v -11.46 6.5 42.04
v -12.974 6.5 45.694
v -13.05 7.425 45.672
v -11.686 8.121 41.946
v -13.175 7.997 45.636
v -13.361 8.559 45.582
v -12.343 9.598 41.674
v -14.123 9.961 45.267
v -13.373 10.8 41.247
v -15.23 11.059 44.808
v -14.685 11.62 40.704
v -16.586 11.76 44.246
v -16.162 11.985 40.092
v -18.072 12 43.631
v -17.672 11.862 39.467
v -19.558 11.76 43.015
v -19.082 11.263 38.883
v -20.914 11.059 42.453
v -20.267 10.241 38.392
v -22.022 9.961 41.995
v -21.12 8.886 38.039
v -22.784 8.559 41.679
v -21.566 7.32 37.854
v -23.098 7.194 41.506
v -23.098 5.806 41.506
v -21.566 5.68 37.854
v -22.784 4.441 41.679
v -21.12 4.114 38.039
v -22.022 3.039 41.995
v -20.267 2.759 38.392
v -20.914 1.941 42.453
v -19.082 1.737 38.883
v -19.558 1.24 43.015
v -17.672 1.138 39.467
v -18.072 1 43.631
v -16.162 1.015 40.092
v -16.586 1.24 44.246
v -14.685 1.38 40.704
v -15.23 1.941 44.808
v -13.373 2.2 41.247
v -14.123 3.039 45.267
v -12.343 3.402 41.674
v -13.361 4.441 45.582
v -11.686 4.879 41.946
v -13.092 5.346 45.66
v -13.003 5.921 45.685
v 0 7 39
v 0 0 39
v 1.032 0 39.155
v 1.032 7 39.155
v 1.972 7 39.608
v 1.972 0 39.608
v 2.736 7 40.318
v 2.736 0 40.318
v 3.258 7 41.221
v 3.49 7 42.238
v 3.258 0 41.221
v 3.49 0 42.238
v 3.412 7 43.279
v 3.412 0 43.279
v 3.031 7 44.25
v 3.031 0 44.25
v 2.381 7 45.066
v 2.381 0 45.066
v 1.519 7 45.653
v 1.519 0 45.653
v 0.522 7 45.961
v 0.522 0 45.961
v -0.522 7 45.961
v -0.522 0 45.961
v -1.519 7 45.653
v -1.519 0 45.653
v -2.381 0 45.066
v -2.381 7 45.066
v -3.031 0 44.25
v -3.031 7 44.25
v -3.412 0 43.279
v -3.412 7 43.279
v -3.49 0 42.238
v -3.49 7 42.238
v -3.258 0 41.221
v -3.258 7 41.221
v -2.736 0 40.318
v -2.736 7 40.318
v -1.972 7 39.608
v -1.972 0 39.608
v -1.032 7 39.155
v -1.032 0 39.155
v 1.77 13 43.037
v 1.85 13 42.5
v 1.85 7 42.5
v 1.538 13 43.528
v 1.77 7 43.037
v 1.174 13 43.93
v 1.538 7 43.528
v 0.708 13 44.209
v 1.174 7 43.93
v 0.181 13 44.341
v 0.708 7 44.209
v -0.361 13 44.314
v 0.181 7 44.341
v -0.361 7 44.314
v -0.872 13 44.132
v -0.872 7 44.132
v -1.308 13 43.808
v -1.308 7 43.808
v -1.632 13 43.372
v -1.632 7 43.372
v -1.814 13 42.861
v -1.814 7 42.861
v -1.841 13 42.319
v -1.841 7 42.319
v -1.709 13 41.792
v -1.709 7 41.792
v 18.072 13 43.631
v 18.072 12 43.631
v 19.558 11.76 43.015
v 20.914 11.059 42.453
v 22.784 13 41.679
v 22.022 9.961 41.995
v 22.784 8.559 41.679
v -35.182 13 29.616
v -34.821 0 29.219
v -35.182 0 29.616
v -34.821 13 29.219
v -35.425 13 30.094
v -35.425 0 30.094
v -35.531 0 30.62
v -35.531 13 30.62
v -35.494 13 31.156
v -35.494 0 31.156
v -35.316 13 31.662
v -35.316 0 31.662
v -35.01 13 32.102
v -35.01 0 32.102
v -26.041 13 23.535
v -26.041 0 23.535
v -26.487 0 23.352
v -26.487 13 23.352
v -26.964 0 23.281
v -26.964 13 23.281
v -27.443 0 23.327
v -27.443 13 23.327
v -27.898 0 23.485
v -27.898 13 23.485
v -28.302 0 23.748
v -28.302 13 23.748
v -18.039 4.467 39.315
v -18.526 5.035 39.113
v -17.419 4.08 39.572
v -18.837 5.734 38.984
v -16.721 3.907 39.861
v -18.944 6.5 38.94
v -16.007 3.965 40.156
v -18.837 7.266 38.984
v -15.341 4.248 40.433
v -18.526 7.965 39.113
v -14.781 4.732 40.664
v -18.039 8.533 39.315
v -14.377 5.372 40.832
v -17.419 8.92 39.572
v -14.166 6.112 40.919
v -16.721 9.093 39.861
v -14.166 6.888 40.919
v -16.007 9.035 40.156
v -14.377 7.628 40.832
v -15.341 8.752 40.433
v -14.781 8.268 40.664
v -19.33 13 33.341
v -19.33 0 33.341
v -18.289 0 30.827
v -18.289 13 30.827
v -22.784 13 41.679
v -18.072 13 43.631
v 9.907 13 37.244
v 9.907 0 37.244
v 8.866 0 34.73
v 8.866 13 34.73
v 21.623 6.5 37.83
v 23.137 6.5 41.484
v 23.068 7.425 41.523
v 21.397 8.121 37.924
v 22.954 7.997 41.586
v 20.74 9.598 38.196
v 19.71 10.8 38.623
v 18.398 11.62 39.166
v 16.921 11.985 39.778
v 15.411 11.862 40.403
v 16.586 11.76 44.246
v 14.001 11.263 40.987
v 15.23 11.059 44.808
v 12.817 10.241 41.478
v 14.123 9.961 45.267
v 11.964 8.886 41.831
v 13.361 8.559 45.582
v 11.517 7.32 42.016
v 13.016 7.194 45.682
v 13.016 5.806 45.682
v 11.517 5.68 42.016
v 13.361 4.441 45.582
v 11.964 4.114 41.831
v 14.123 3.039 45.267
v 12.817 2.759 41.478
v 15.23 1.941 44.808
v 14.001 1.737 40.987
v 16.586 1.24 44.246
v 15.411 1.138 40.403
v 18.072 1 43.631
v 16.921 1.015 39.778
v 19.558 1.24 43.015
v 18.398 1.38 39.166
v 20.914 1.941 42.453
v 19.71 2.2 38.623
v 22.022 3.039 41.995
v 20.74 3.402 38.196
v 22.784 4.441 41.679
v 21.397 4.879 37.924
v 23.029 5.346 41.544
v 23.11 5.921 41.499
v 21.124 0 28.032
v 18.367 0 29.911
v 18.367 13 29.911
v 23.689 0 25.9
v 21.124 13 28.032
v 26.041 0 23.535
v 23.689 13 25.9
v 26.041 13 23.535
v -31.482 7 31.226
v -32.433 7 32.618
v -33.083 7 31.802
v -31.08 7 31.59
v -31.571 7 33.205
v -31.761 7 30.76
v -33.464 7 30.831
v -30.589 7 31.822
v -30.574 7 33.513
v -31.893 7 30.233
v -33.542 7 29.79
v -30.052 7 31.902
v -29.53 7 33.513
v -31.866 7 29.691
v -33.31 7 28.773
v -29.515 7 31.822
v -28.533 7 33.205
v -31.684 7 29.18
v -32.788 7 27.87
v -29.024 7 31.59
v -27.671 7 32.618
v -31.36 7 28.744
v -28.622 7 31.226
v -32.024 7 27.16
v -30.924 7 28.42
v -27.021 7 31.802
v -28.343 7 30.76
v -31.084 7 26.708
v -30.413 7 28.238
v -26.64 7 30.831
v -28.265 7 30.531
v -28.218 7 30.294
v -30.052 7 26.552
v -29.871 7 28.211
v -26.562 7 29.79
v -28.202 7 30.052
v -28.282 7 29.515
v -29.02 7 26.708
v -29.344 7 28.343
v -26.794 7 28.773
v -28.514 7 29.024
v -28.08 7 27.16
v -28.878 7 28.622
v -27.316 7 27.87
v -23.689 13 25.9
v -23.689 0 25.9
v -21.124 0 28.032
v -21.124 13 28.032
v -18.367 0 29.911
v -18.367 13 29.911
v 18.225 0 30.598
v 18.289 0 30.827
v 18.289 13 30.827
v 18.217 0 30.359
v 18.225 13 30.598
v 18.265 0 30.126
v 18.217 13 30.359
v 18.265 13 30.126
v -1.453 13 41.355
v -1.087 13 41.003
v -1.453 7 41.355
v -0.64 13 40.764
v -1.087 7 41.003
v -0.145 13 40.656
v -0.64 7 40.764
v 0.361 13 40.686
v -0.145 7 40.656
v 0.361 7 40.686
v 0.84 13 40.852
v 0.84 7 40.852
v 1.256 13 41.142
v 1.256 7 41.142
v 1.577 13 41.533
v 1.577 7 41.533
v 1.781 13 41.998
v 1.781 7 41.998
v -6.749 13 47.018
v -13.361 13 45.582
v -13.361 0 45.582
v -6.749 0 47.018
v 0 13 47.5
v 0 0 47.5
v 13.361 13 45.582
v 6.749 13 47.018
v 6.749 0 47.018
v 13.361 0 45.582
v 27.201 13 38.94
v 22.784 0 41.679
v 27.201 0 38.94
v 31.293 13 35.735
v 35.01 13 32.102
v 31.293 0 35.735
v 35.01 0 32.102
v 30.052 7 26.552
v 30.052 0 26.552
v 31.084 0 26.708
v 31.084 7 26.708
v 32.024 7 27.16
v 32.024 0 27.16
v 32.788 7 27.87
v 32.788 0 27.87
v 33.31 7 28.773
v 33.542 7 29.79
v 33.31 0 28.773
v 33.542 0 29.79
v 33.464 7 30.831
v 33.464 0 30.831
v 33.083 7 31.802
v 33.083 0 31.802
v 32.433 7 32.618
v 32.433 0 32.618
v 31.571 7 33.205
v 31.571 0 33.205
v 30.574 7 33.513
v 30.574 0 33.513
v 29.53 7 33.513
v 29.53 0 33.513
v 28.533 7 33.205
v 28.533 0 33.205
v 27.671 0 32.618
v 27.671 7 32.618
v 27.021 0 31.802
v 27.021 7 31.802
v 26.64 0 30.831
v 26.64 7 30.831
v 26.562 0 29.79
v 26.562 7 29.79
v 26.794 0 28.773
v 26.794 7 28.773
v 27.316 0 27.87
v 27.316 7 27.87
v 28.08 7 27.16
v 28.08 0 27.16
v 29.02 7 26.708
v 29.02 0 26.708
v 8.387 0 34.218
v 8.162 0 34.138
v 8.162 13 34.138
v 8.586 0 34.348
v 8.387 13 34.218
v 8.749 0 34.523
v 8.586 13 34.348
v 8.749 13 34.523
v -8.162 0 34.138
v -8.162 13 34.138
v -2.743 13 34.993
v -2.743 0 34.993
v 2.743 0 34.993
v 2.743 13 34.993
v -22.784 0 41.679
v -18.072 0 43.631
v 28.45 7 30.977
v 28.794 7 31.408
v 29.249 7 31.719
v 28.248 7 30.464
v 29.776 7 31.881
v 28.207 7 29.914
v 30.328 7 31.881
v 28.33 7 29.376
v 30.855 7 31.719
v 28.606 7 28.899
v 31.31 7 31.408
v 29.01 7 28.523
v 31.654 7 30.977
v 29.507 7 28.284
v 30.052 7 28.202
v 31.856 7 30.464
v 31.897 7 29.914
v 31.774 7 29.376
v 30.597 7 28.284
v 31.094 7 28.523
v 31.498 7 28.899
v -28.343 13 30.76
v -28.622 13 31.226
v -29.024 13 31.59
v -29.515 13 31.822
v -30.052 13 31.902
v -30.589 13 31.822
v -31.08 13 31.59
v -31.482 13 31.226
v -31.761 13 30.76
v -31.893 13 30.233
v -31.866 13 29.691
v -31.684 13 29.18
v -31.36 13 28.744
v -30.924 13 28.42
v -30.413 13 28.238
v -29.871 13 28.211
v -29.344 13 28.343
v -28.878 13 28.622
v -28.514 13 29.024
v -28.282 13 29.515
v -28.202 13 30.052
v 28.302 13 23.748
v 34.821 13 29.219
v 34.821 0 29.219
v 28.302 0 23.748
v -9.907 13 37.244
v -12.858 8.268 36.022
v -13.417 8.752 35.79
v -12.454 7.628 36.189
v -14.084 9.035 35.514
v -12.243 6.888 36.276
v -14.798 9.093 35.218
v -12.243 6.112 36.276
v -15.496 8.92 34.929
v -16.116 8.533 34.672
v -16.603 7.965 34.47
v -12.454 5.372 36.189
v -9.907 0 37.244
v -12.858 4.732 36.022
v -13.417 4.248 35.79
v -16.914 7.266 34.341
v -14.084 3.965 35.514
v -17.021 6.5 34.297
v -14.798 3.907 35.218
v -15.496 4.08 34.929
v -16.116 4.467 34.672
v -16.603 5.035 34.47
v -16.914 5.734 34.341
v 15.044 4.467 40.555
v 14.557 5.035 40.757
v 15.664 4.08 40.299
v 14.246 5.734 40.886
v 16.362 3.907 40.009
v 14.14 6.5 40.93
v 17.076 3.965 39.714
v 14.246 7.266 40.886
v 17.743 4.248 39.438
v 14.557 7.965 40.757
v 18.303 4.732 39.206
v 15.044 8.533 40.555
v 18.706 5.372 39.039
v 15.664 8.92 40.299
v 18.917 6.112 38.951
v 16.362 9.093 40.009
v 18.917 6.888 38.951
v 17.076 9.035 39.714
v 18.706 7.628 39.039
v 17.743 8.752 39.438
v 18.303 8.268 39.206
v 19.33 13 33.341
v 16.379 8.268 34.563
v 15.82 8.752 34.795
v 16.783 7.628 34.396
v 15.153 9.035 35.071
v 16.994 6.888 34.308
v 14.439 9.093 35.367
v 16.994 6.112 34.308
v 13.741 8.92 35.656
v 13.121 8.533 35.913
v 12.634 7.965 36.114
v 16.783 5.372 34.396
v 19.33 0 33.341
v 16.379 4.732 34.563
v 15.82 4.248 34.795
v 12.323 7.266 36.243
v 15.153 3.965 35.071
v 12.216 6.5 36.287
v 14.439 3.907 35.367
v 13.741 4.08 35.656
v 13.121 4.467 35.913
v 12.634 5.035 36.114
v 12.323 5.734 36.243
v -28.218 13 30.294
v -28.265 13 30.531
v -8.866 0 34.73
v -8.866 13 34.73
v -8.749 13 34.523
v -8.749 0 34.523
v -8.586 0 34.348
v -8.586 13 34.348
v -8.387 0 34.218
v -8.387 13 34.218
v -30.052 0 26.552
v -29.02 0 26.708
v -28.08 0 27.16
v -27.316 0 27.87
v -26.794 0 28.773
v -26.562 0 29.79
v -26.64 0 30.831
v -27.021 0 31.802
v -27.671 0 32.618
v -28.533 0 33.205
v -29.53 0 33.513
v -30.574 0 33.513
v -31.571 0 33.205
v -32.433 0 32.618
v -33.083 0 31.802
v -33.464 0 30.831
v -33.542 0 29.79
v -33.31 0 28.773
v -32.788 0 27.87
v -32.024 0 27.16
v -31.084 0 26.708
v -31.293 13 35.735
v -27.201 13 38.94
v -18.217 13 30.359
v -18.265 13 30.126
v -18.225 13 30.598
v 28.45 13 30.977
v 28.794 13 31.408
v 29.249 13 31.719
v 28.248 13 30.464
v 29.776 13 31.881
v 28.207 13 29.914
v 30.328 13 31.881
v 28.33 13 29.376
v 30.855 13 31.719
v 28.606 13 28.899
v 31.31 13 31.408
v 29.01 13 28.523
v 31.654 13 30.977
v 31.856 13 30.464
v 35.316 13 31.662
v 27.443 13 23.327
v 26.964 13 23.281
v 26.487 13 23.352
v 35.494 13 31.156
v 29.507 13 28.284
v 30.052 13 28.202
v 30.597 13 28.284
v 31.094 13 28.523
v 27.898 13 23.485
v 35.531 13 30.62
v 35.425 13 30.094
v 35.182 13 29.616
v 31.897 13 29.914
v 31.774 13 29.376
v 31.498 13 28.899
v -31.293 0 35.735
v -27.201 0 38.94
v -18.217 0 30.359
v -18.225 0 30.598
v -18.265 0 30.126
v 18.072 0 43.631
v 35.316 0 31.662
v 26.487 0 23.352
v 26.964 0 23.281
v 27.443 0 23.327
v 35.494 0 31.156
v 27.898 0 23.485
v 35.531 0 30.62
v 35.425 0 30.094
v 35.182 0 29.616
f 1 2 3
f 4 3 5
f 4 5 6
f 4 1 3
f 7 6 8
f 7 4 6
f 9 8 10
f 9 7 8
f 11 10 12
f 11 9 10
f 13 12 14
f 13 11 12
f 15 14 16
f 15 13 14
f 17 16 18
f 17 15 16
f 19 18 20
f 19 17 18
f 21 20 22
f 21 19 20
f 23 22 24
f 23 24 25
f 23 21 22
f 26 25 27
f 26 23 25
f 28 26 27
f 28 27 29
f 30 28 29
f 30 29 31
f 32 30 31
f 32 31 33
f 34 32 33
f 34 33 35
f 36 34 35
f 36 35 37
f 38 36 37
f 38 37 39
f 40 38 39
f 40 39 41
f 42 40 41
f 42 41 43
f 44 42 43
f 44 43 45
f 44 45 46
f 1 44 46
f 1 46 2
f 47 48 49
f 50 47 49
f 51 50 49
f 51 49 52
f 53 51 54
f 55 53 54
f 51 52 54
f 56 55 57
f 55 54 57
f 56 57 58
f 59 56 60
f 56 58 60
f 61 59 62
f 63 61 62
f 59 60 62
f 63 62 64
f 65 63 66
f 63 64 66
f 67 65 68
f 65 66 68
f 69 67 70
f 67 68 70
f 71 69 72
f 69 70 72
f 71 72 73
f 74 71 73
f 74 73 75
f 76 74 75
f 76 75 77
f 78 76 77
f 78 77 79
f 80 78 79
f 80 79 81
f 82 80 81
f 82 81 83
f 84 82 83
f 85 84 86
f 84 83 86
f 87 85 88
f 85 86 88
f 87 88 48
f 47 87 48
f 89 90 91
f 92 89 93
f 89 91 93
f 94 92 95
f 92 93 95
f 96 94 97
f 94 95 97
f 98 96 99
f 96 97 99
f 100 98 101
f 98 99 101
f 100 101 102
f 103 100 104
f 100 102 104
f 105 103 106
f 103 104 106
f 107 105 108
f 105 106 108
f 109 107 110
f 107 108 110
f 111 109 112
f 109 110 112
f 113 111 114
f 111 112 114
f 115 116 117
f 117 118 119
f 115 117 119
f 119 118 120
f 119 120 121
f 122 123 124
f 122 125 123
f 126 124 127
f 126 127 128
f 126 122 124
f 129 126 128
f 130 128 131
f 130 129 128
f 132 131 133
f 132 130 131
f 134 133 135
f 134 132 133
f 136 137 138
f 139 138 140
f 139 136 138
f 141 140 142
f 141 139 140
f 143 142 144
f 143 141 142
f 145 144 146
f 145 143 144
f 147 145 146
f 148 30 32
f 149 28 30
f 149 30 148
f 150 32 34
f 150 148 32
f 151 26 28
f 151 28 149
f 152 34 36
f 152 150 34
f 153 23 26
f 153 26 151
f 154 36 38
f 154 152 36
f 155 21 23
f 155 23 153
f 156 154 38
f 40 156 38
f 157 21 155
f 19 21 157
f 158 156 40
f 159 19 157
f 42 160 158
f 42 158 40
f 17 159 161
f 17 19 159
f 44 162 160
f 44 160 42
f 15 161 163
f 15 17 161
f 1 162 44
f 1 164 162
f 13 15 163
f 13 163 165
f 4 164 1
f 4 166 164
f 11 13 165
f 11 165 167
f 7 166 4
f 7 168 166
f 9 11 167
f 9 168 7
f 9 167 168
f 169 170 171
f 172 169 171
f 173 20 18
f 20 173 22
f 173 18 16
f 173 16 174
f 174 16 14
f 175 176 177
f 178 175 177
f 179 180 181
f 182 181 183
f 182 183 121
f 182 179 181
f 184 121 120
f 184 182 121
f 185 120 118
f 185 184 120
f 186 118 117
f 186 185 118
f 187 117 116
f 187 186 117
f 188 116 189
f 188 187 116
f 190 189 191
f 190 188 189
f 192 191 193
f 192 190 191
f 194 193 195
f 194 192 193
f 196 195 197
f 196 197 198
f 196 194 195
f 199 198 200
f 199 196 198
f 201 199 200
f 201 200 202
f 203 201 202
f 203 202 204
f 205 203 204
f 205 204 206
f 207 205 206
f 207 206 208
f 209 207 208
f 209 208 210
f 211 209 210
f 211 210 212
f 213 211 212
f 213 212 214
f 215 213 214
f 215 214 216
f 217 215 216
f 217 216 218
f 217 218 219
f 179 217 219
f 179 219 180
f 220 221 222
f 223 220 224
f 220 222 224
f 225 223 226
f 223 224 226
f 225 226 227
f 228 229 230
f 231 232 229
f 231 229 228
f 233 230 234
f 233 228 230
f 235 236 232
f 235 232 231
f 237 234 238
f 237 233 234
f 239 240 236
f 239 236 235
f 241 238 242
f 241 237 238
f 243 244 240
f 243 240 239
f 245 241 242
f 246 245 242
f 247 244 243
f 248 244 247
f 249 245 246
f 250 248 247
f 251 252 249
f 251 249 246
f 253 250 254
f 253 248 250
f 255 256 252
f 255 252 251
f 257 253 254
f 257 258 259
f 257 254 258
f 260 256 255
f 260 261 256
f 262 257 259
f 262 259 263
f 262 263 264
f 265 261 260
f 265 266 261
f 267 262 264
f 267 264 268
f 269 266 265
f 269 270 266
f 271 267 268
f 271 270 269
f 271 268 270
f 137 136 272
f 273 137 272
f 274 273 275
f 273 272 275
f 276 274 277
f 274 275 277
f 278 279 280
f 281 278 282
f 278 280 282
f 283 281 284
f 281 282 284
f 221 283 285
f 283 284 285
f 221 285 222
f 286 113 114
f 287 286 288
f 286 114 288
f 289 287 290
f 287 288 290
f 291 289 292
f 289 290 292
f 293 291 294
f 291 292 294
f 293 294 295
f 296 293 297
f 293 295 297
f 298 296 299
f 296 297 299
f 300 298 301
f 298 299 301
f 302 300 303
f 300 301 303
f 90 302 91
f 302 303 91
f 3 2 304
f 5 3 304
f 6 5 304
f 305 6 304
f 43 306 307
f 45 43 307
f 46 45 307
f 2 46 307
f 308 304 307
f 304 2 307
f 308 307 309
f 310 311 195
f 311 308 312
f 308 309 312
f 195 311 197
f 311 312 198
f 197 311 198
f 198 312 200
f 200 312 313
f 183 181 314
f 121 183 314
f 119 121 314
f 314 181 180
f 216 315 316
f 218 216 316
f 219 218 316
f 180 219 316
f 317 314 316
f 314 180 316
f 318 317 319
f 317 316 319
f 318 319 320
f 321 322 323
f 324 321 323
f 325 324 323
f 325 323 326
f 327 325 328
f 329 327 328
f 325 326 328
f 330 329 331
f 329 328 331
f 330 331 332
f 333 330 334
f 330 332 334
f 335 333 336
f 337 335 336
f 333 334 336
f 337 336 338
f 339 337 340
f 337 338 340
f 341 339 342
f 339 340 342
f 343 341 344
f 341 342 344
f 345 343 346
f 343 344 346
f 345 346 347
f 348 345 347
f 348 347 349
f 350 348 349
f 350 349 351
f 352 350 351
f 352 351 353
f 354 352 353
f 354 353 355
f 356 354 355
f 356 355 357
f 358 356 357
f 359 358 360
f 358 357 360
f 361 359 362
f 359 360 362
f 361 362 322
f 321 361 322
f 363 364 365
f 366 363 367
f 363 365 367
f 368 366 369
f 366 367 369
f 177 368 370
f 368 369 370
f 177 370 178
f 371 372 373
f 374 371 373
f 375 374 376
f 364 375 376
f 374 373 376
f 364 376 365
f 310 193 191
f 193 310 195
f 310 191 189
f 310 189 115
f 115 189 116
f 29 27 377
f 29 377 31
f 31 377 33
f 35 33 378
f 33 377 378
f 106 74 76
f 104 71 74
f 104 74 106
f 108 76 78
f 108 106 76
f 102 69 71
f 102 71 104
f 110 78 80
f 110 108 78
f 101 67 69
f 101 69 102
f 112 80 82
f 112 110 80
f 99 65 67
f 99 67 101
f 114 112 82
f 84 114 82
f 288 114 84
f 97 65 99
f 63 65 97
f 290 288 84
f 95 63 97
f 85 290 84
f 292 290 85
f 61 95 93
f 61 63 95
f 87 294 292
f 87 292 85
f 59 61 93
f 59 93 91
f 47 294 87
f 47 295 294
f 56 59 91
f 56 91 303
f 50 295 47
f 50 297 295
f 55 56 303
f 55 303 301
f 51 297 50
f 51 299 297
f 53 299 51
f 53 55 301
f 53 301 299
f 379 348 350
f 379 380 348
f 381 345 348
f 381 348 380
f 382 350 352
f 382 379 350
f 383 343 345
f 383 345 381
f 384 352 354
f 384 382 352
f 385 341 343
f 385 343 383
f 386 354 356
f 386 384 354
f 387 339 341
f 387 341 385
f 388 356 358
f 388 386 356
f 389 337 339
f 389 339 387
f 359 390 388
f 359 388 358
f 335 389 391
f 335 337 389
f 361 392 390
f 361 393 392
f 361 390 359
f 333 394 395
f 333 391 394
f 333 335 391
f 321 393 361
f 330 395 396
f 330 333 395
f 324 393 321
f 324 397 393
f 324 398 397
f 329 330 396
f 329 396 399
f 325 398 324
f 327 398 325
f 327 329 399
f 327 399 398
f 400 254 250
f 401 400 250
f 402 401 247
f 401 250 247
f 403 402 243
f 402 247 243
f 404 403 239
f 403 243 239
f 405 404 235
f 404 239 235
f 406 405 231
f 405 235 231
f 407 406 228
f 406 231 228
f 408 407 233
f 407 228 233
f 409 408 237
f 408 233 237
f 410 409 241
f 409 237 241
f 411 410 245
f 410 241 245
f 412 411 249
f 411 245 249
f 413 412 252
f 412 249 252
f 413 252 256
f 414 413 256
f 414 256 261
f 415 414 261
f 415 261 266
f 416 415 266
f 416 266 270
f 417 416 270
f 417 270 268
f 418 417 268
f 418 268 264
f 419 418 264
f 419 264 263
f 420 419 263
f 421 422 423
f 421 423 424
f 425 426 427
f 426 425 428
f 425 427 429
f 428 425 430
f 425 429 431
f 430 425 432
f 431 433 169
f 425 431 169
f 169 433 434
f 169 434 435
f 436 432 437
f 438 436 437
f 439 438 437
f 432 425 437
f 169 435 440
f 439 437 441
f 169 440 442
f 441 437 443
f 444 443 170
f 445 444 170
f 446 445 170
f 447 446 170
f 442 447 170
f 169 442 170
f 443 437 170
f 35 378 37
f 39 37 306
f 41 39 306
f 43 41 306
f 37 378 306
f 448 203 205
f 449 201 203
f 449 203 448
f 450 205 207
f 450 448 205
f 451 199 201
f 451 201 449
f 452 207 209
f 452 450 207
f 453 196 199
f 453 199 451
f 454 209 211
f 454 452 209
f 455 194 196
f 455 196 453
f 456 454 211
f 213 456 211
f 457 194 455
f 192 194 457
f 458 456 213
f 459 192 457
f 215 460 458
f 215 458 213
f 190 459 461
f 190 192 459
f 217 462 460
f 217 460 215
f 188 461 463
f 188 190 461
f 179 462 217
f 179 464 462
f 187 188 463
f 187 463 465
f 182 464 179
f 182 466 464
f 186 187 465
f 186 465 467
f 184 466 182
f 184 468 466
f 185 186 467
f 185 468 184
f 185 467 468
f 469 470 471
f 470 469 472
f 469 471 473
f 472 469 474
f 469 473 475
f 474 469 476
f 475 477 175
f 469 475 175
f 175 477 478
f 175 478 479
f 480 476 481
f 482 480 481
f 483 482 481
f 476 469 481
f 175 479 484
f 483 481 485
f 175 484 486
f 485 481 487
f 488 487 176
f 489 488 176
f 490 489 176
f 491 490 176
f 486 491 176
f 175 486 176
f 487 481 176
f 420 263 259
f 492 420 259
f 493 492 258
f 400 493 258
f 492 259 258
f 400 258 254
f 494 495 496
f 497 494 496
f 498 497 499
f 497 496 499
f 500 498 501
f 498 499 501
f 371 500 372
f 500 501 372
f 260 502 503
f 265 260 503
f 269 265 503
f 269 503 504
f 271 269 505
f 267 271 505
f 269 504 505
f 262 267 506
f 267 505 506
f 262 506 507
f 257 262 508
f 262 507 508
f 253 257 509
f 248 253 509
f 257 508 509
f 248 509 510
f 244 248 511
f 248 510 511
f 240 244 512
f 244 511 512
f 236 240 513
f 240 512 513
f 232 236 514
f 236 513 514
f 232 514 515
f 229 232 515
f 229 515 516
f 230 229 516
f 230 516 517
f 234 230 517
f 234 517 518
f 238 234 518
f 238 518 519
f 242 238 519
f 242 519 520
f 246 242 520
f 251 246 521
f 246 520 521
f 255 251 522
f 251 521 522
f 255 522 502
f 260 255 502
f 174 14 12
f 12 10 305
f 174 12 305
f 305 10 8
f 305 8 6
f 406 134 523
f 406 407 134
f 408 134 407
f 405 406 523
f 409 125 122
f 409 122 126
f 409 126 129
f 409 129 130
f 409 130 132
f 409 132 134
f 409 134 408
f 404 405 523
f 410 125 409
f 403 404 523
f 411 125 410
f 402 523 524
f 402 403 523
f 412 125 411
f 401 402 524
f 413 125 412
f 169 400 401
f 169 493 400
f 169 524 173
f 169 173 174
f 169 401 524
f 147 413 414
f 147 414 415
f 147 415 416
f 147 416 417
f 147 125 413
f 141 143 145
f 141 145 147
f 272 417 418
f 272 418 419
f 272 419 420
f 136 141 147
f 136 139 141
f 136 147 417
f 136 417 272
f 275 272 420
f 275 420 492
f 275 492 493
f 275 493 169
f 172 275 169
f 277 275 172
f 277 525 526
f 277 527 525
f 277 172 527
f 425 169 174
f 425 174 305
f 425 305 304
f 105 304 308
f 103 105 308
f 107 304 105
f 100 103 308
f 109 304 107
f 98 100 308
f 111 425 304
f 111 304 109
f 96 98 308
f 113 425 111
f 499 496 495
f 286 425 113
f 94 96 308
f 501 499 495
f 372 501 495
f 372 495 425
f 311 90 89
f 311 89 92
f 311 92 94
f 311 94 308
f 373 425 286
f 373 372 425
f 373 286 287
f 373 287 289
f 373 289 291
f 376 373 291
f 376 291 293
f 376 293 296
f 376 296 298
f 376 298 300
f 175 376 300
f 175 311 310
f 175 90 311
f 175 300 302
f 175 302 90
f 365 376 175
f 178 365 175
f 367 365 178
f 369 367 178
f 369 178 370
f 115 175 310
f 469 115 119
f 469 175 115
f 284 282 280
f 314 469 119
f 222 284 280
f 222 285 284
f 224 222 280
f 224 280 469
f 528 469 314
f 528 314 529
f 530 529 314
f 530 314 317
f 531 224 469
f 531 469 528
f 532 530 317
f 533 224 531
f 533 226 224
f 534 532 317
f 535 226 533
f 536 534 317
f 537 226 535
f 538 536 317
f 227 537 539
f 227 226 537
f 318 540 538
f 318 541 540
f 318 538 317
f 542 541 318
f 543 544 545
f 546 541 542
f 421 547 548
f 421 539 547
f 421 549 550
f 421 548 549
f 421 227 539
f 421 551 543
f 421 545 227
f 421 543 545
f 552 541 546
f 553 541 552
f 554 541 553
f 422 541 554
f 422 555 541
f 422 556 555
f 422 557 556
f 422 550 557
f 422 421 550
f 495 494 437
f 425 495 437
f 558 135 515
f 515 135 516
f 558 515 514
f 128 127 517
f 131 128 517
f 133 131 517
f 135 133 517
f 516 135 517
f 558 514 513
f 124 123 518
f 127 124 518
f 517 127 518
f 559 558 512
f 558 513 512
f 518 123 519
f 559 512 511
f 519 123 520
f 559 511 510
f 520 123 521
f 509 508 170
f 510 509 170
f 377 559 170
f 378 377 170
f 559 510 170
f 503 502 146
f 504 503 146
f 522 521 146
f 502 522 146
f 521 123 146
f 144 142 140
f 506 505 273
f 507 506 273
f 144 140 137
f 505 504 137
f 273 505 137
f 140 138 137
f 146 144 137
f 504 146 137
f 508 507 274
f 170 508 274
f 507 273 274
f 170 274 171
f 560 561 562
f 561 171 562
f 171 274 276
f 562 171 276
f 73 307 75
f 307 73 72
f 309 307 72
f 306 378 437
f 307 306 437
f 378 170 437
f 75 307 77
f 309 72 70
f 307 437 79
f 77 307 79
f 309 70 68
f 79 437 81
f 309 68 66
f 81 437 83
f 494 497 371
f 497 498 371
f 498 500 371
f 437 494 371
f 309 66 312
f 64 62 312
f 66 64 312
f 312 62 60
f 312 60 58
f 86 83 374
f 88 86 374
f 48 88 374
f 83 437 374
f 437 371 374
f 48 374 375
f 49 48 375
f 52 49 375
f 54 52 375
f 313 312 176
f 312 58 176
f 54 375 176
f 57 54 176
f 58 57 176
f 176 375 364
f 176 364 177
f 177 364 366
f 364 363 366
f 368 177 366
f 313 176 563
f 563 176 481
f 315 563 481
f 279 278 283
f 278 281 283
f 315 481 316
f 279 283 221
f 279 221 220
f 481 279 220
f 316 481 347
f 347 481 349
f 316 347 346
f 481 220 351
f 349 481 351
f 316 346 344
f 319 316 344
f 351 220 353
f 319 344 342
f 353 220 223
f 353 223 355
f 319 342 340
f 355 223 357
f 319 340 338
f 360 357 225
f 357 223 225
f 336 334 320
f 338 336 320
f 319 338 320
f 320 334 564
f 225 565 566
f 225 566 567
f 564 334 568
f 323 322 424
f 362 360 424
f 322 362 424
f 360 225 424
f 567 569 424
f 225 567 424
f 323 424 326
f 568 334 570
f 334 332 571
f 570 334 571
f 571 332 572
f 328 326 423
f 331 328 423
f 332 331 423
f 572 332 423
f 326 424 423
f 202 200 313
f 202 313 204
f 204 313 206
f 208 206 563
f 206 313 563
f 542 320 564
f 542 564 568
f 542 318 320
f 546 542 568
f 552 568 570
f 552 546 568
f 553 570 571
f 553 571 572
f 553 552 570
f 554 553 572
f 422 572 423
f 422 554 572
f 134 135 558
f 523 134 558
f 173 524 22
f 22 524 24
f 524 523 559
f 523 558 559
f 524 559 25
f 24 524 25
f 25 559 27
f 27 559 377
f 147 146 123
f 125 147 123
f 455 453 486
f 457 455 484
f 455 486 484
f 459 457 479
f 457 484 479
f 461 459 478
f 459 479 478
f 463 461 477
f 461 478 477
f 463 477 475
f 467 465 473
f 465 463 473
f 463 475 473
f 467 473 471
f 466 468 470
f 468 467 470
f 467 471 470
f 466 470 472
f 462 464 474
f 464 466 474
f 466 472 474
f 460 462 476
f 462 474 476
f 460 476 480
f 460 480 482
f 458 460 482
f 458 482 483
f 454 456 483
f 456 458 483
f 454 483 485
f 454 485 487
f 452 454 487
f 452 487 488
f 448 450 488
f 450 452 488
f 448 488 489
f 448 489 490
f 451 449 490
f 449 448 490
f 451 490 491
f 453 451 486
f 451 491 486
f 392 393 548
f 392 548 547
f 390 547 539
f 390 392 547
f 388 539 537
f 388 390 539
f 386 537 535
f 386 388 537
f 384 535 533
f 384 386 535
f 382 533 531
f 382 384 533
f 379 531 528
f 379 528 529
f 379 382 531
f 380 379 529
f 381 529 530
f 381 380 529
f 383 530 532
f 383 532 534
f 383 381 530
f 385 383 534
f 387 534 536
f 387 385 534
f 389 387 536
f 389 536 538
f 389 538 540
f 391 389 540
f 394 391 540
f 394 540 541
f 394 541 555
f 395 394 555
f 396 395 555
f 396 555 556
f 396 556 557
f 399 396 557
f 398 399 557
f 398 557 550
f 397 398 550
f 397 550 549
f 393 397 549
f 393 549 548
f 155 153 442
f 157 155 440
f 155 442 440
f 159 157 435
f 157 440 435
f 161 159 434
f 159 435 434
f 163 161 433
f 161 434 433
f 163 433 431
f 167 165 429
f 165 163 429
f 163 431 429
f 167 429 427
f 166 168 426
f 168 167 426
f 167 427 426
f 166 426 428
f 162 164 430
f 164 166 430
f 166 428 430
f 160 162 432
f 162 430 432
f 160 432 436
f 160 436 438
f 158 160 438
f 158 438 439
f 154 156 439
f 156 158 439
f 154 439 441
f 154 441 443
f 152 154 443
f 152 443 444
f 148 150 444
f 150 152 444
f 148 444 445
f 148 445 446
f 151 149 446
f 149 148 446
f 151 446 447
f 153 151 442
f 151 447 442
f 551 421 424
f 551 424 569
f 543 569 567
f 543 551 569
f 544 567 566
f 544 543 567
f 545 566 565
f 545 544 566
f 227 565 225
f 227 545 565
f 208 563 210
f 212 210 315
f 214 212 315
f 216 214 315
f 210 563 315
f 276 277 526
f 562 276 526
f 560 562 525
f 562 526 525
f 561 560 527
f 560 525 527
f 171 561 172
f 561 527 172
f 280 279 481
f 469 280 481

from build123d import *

# Parameters (mm, degrees)
SKETCH_1_R          = 1.85
EXTRUDE_1_DEPTH     = 13
SKETCH_2_R          = 2.6
CUT_EXTRUDE_1_DEPTH = 10
SKETCH_3_R          = 2.6
CUT_EXTRUDE_2_DEPTH = 10
FILLET_1_R          = 2
FILLET_2_R          = 1
SKETCH_4_R          = 3.5
SKETCH_4_R_2        = 1.85
CUT_EXTRUDE_3_DEPTH = 7
CUT_EXTRUDE_5_DEPTH = 61.729236251
CUT_EXTRUDE_START   = -4
SKETCH_6_R          = 5.5
SKETCH_6_R_2        = 2.6
CUT_EXTRUDE_6_DEPTH = 4
SKETCH_7_R          = 5.5
SKETCH_7_R_2        = 2.6
CUT_EXTRUDE_7_DEPTH = 4
SKETCH_8_R          = 35.1
CUT_EXTRUDE_8_DEPTH = 61.729236251


with BuildPart() as part:
    # 草图1 → 凸台-拉伸1 (new body)
    with BuildSketch(Plane(origin=(0, 0, 0), x_dir=(1, 0, 0), z_dir=(0, 1, 0))):
        with BuildLine():
            ThreePointArc((-17.962748608, -30.038969064), (-22.702483698, -26.638266346), (-26.811555509, -22.497566339))
            Line((-26.811555509, -22.497566339), (-36.387111048, -30.53241146))
            ThreePointArc((-36.387111048, -30.53241146), (0, -47.5), (36.387111048, -30.53241146))
            Line((36.387111048, -30.53241146), (26.811555509, -22.497566339))
            ThreePointArc((26.811555509, -22.497566339), (22.702483698, -26.638266346), (17.962748608, -30.038969064))
            Line((17.962748608, -30.038969064), (19.330292732, -33.340512637))
            Line((19.330292732, -33.340512637), (9.906721501, -37.243883647))
            Line((9.906721501, -37.243883647), (8.539177376, -33.942340075))
            ThreePointArc((8.539177376, -33.942340075), (0, -35), (-8.539177376, -33.942340075))
            Line((-8.539177376, -33.942340075), (-9.906721501, -37.243883647))
            Line((-9.906721501, -37.243883647), (-19.330292732, -33.340512637))
            Line((-19.330292732, -33.340512637), (-17.962748608, -30.038969064))
        make_face()
        with BuildLine():
            ThreePointArc((-28.2020382, -30.0520382), (-28.237585432, -30.412955296), (-28.342861065, -30.76000255))
            ThreePointArc((-28.342861065, -30.76000255), (-31.866490969, -29.691121105), (-28.2020382, -30.0520382))
        make_face(mode=Mode.SUBTRACT)
        with BuildLine():
            ThreePointArc((1.85, -42.5), (-0.360917096, -44.314452769), (-1.709177135, -41.79203565))
            ThreePointArc((-1.709177135, -41.79203565), (0.360917096, -40.685547231), (1.85, -42.5))
        make_face(mode=Mode.SUBTRACT)
        with Locations(Location((30.0520382, -30.0520382, 0), (0, 0, 90))):
            Circle(SKETCH_1_R, mode=Mode.SUBTRACT)
    extrude(amount=EXTRUDE_1_DEPTH)

    # 草图2 → 切除-拉伸1 (cut)
    with BuildSketch(Plane(origin=(-14.618507116, 0, 35.292198142), x_dir=(-0.9238795325112864, 0, -0.38268343236509067), z_dir=(0.38268343236509067, 0, -0.9238795325112864))):
        with Locations((0, 6.5)):
            Circle(SKETCH_2_R)
    extrude(amount=-CUT_EXTRUDE_1_DEPTH, mode=Mode.SUBTRACT)

    # 草图3 → 切除-拉伸2 (cut)
    with BuildSketch(Plane(origin=(14.618507116, 0, 35.292198142), x_dir=(-0.9238795325112864, 0, 0.38268343236509067), z_dir=(-0.38268343236509067, 0, -0.9238795325112864))):
        with Locations((0, 6.5)):
            Circle(SKETCH_3_R)
    extrude(amount=-CUT_EXTRUDE_2_DEPTH, mode=Mode.SUBTRACT)

    # 圆角1
    fillet_1_edges = [part.edges().sort_by_distance(p)[0] for p in [
        (-26.811555509, 6.5, 22.497566339),
        (26.811555509, 6.5, 22.497566339),
        (36.387111048, 6.5, 30.53241146),
        (-36.387111048, 6.5, 30.53241146),
    ]]
    fillet(fillet_1_edges, radius=FILLET_1_R)

    # 圆角2
    fillet_2_edges = [part.edges().sort_by_distance(p)[0] for p in [
        (-17.962748608, 6.5, 30.038969064),
        (-8.539177376, 6.5, 33.942340075),
        (8.539177376, 6.5, 33.942340075),
        (17.962748608, 6.5, 30.038969064),
    ]]
    fillet(fillet_2_edges, radius=FILLET_2_R)

    # 草图4 → 切除-拉伸3 (cut)
    # profile 1 of 3: a face of its own
    with BuildSketch(Plane.XZ):
        with Locations(Location((-30.0520382, 30.0520382, 0), (0, 0, 270))):
            Circle(SKETCH_4_R)
        with Locations(Location((-30.0520382, 30.0520382, 0), (0, 0, 270))):
            Circle(SKETCH_4_R_2, mode=Mode.SUBTRACT)
    # profile 2 of 3: a face of its own
    with BuildSketch(Plane.XZ):
        with Locations(Location((0, 42.5, 0), (0, 0, 270))):
            Circle(SKETCH_4_R)
        with Locations(Location((0, 42.5, 0), (0, 0, 270))):
            Circle(SKETCH_4_R_2, mode=Mode.SUBTRACT)
    # profile 3 of 3: a face of its own
    with BuildSketch(Plane.XZ):
        with Locations(Location((30.0520382, 30.0520382, 0), (0, 0, 270))):
            Circle(SKETCH_4_R)
        with Locations(Location((30.0520382, 30.0520382, 0), (0, 0, 270))):
            Circle(SKETCH_4_R_2, mode=Mode.SUBTRACT)
    extrude(amount=-CUT_EXTRUDE_3_DEPTH, mode=Mode.SUBTRACT)

    # 草图5 → 切除-拉伸5 (cut, through all)
    with BuildSketch(Plane.XZ):
        with BuildLine():
            Line((-22.784170244, 41.67891057), (-18.072384629, 43.630596075))
            Line((-18.072384629, 43.630596075), (-18.177463037, 43.884277794))
            ThreePointArc((-18.177463037, 43.884277794), (-20.510479308, 42.843555391), (-22.784170244, 41.67891057))
        make_face()
        with BuildLine():
            Line((-18.177463037, 43.884277794), (-18.072384629, 43.630596075))
            Line((-18.072384629, 43.630596075), (-13.360599013, 45.58228158))
            ThreePointArc((-13.360599013, 45.58228158), (-15.791869544, 44.798067551), (-18.177463037, 43.884277794))
        make_face()
        with BuildLine():
            ThreePointArc((18.177463037, 43.884277794), (15.791869544, 44.798067551), (13.360599013, 45.58228158))
            Line((13.360599013, 45.58228158), (18.072384629, 43.630596075))
            Line((18.072384629, 43.630596075), (18.177463037, 43.884277794))
        make_face()
        with BuildLine():
            Line((18.177463037, 43.884277794), (18.072384629, 43.630596075))
            Line((18.072384629, 43.630596075), (22.784170244, 41.67891057))
            ThreePointArc((22.784170244, 41.67891057), (20.510479308, 42.843555391), (18.177463037, 43.884277794))
        make_face()
    extrude(amount=-CUT_EXTRUDE_5_DEPTH, mode=Mode.SUBTRACT)

    # 草图6 → 切除-拉伸6 (cut)
    with BuildSketch(Plane(origin=(-18.072384629, 0, 43.630596075), x_dir=(0.9238795325112865, 0, 0.38268343236509045), z_dir=(-0.38268343236509045, 0, 0.9238795325112865)).offset(CUT_EXTRUDE_START)):
        with Locations((0, 6.5)):
            Circle(SKETCH_6_R)
        with Locations(Location((0, 6.5, 0), (0, 0, 180))):
            Circle(SKETCH_6_R_2, mode=Mode.SUBTRACT)
    extrude(amount=CUT_EXTRUDE_6_DEPTH, mode=Mode.SUBTRACT)

    # 草图7 → 切除-拉伸7 (cut)
    with BuildSketch(Plane(origin=(18.072384629, 0, 43.630596075), x_dir=(0.9238795325112865, 0, -0.38268343236509045), z_dir=(0.38268343236509045, 0, 0.9238795325112865)).offset(CUT_EXTRUDE_START)):
        with Locations((0, 6.5)):
            Circle(SKETCH_7_R)
        with Locations(Location((0, 6.5, 0), (0, 0, 180))):
            Circle(SKETCH_7_R_2, mode=Mode.SUBTRACT)
    extrude(amount=CUT_EXTRUDE_7_DEPTH, mode=Mode.SUBTRACT)

    # 草图8 → 切除-拉伸8 (cut, through all)
    with BuildSketch(Plane(origin=(0, 13, 0), x_dir=(1, 0, 0), z_dir=(0, 1, 0))):
        Circle(SKETCH_8_R)
    extrude(amount=-CUT_EXTRUDE_8_DEPTH, mode=Mode.SUBTRACT)


solid = part.part
